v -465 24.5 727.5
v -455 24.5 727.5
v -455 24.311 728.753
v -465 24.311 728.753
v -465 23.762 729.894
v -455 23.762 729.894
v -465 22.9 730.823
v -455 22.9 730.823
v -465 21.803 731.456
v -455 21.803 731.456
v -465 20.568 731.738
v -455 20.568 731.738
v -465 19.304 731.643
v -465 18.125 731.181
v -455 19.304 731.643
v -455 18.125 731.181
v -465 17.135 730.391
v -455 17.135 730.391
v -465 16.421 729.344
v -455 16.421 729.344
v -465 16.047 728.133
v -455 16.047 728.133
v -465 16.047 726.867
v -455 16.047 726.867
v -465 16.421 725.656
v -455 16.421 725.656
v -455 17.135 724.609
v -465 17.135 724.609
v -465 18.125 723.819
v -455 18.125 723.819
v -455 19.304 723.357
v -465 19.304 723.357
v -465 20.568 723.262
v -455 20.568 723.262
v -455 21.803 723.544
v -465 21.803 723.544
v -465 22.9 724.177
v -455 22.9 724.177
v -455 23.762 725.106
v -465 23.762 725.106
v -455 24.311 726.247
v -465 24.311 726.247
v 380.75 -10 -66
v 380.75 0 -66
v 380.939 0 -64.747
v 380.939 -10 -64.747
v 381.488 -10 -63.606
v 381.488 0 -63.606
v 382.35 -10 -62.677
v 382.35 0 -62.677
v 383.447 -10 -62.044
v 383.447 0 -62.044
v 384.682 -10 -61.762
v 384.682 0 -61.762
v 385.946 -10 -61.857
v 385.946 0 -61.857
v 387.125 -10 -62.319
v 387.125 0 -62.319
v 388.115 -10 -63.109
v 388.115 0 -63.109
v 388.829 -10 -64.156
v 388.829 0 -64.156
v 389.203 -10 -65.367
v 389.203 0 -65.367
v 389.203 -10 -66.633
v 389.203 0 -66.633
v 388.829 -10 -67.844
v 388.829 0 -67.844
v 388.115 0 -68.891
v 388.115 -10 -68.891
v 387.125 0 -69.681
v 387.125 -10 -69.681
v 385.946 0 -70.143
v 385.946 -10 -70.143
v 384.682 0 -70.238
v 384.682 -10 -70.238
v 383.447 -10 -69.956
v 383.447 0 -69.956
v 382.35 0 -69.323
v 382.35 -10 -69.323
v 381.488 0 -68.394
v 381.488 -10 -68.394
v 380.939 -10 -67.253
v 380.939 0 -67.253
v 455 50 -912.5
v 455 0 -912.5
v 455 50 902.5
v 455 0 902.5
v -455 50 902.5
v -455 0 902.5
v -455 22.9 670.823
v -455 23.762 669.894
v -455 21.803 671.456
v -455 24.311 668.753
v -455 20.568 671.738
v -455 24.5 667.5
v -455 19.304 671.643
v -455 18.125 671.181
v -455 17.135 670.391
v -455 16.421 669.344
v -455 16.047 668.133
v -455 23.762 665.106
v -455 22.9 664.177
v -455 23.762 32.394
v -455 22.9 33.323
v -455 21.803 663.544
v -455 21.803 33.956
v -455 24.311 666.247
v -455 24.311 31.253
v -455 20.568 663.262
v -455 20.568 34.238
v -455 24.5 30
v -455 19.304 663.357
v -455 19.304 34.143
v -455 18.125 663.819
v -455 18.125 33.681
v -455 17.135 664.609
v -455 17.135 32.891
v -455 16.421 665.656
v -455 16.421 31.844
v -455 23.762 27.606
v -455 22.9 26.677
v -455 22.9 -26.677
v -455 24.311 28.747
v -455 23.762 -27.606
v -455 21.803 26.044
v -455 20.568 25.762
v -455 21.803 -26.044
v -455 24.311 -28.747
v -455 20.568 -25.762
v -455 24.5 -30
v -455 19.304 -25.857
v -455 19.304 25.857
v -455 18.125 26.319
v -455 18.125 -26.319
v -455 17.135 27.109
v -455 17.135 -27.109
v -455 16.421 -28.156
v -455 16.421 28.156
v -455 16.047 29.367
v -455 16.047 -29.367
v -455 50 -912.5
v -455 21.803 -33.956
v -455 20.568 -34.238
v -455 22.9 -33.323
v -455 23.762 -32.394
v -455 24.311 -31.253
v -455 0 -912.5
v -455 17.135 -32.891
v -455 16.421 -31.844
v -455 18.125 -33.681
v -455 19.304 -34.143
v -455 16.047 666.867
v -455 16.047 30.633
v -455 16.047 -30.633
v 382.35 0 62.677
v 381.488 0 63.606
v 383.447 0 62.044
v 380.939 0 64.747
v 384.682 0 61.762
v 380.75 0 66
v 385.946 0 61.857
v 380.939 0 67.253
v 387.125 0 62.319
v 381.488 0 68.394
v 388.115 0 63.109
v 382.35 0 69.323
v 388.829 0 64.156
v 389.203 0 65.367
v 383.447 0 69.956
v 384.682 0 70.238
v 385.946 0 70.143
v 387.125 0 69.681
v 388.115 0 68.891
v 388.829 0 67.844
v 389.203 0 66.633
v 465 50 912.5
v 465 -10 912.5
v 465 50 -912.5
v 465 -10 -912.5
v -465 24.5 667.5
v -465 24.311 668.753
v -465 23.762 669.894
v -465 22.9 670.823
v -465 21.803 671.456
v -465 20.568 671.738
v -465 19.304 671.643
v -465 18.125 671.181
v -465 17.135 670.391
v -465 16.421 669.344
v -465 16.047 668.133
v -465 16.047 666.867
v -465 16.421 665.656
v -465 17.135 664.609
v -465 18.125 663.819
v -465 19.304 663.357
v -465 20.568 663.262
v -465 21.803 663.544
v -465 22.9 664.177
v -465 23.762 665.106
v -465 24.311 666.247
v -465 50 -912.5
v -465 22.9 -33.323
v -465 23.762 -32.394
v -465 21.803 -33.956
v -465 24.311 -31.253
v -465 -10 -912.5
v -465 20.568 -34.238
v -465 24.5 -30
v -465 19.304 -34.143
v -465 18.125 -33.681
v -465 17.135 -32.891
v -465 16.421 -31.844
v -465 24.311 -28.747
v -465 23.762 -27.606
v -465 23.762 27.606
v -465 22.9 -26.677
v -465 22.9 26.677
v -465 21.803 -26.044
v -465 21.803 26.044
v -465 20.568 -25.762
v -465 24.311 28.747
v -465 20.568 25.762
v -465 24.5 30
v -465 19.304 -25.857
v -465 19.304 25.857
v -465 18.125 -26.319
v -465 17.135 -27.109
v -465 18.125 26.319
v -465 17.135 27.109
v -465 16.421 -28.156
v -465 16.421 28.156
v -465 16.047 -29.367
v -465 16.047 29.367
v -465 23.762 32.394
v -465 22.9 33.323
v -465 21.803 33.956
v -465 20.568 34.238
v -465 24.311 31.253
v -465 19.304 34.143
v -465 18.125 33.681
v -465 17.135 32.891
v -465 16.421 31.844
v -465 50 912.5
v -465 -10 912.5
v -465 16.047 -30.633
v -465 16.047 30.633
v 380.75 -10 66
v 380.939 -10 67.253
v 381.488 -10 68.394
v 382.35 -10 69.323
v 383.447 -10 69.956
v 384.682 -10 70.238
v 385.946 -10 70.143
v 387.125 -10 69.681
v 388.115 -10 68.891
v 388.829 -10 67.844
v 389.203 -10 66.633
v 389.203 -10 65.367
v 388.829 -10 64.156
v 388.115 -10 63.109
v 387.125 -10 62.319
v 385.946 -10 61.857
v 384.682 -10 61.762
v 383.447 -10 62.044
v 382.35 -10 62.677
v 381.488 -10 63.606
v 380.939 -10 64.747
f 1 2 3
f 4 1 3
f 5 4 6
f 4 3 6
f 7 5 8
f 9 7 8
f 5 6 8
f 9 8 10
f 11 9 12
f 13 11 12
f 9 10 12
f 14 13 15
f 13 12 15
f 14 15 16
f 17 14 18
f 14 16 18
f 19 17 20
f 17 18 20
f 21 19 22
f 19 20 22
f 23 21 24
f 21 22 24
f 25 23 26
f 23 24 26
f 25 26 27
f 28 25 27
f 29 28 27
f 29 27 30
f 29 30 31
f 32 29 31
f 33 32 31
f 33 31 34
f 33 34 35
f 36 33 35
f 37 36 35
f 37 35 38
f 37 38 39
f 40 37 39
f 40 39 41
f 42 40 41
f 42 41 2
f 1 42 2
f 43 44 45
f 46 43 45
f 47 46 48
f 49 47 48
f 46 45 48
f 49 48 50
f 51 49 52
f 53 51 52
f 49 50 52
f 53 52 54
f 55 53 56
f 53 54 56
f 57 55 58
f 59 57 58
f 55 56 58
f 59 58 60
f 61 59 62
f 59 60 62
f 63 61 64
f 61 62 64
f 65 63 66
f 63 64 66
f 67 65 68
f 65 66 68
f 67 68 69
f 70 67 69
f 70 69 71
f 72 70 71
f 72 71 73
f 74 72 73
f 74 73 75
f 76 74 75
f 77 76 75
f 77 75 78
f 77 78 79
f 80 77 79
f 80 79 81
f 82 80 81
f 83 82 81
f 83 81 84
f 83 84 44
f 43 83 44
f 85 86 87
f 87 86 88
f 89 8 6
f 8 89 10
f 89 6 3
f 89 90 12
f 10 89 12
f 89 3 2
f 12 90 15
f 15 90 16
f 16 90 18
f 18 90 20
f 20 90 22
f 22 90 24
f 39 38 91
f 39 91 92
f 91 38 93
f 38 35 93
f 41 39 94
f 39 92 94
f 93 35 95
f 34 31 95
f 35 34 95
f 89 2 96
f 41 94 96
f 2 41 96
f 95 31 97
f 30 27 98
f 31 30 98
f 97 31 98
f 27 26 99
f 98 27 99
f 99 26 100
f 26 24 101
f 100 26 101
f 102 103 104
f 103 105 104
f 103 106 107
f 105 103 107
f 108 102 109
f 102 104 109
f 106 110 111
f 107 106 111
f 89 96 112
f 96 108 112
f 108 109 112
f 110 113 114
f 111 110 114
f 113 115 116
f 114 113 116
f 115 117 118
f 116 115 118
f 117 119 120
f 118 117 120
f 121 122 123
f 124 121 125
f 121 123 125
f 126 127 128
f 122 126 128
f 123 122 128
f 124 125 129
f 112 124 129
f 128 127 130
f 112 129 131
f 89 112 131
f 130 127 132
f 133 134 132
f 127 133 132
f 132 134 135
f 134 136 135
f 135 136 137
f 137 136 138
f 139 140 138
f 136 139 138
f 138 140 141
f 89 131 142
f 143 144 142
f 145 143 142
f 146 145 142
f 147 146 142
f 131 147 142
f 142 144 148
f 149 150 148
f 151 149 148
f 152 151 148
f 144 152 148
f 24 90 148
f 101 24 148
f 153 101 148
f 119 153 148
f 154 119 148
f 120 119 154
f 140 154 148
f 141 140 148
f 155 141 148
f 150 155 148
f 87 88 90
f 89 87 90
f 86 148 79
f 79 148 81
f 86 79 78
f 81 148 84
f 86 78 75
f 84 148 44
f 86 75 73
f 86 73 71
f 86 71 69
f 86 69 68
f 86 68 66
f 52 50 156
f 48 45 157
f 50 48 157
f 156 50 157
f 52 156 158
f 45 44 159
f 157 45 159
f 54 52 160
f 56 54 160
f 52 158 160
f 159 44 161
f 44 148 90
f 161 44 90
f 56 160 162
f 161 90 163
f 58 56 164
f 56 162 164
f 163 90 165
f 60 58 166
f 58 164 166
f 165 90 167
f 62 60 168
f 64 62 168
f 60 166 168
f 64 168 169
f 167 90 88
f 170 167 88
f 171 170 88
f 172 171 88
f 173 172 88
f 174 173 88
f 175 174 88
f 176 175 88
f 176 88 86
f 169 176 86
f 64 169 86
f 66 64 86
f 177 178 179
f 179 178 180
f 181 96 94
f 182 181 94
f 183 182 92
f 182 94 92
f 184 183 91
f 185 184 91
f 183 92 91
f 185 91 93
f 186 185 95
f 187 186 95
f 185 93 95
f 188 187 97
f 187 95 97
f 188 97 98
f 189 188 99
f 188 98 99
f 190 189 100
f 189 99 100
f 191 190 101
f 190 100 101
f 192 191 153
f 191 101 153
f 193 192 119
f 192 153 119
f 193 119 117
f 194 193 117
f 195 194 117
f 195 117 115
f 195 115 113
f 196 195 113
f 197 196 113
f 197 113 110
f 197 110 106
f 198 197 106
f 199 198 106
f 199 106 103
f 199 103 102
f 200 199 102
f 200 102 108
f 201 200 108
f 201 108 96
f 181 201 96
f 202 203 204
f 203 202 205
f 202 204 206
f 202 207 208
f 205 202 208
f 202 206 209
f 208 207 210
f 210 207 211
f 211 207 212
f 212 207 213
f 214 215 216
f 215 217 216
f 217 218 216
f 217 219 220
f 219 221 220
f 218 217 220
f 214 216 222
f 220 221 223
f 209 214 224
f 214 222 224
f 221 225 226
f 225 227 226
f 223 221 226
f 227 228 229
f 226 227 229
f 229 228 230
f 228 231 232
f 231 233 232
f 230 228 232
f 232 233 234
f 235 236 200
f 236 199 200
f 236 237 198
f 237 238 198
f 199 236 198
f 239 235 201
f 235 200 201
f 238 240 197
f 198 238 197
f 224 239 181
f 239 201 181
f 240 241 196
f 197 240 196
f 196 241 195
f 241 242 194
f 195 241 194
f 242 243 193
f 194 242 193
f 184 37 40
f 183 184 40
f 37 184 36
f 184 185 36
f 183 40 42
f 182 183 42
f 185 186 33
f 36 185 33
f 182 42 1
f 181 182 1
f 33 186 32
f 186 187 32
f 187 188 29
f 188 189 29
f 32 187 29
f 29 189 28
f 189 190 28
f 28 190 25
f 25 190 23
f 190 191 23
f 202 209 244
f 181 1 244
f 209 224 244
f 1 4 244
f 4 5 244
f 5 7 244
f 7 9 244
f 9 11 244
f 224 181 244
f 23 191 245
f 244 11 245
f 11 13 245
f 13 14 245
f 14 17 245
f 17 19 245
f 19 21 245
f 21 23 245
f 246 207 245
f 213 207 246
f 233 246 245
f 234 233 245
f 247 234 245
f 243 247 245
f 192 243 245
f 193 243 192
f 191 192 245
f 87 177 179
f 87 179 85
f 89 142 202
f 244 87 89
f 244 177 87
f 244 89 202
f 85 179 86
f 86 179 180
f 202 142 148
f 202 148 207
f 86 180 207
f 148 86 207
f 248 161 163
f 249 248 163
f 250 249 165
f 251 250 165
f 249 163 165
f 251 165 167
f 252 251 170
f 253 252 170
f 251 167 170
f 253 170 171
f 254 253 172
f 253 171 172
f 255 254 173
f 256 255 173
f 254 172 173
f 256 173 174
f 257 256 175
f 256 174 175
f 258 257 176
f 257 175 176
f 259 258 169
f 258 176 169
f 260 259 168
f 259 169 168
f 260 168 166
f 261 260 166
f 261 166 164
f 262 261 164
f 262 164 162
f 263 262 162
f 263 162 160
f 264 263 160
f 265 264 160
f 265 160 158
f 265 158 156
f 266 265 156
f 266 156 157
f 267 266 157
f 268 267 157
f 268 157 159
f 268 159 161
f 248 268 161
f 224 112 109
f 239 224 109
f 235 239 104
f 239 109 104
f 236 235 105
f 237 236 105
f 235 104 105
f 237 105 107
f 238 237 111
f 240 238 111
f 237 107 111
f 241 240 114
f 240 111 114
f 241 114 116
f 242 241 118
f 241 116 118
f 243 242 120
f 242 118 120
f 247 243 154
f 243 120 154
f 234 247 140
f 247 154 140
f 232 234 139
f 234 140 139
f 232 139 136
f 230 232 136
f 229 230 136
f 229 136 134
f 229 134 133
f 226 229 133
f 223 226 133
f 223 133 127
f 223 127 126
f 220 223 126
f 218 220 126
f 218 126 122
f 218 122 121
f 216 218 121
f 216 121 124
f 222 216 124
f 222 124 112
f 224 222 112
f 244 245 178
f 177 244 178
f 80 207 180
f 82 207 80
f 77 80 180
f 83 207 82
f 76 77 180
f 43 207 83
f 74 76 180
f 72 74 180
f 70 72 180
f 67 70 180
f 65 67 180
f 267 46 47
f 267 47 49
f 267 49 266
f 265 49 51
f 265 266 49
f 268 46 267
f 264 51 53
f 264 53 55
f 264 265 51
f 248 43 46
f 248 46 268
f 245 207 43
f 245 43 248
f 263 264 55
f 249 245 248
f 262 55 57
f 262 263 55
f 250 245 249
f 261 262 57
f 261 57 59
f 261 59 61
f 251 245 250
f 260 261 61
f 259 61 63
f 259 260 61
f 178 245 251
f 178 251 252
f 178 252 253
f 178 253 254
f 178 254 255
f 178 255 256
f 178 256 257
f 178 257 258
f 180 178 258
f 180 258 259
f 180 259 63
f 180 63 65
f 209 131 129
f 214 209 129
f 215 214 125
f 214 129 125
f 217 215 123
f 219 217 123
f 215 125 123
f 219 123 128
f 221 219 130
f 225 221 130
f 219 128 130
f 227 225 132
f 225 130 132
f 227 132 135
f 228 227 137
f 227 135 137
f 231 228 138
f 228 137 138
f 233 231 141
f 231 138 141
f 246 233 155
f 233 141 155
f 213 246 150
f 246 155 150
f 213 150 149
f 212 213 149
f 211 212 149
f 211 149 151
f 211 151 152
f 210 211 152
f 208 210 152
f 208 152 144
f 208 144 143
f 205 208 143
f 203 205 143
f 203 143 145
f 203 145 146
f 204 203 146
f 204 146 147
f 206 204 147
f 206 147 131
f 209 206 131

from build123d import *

# Parameters (mm, degrees)
F0_W     = 930
F0_H     = 1825
F1_DEPTH = 10
F3_DEPTH = 50
F5_D     = 8.5
F7_D     = 8.5
F7_DEPTH = 15


with BuildPart() as f1:
    # F0 (on Front) → F1 (new body)
    with BuildSketch(Plane.XZ):
        Rectangle(F0_W, F0_H)
    extrude(amount=F1_DEPTH)

    # F2 (on face) → F3 (join)
    with BuildSketch(Plane(origin=(0, 0, 0), x_dir=(-1, 0, 0), z_dir=(0, 1, 0))):
        Polygon((465, 912.5), (-465, 912.5), (-465, -912.5), (-455, -912.5), (-455, 902.500026), (455.000026, 902.500026), (455.000026, -912.5), (465, -912.5), align=None)
    extrude(amount=F3_DEPTH)

    # F5 (through all)
    with Locations(Plane.XZ.offset(10)):
        with Locations((385, 66), (385, -66)):
            Hole(F5_D / 2)

    # F7
    with Locations(Plane(origin=(-465, 0, 0), x_dir=(0, -1, 0), z_dir=(-1, 0, 0))):
        with Locations((-20.25, 727.5), (-20.25, 667.5), (-20.25, 1157.5), (-20.25, 1097.5), (-20.25, 30), (-20.25, -30)):
            Hole(F7_D / 2, depth=F7_DEPTH)


solid = f1.part
